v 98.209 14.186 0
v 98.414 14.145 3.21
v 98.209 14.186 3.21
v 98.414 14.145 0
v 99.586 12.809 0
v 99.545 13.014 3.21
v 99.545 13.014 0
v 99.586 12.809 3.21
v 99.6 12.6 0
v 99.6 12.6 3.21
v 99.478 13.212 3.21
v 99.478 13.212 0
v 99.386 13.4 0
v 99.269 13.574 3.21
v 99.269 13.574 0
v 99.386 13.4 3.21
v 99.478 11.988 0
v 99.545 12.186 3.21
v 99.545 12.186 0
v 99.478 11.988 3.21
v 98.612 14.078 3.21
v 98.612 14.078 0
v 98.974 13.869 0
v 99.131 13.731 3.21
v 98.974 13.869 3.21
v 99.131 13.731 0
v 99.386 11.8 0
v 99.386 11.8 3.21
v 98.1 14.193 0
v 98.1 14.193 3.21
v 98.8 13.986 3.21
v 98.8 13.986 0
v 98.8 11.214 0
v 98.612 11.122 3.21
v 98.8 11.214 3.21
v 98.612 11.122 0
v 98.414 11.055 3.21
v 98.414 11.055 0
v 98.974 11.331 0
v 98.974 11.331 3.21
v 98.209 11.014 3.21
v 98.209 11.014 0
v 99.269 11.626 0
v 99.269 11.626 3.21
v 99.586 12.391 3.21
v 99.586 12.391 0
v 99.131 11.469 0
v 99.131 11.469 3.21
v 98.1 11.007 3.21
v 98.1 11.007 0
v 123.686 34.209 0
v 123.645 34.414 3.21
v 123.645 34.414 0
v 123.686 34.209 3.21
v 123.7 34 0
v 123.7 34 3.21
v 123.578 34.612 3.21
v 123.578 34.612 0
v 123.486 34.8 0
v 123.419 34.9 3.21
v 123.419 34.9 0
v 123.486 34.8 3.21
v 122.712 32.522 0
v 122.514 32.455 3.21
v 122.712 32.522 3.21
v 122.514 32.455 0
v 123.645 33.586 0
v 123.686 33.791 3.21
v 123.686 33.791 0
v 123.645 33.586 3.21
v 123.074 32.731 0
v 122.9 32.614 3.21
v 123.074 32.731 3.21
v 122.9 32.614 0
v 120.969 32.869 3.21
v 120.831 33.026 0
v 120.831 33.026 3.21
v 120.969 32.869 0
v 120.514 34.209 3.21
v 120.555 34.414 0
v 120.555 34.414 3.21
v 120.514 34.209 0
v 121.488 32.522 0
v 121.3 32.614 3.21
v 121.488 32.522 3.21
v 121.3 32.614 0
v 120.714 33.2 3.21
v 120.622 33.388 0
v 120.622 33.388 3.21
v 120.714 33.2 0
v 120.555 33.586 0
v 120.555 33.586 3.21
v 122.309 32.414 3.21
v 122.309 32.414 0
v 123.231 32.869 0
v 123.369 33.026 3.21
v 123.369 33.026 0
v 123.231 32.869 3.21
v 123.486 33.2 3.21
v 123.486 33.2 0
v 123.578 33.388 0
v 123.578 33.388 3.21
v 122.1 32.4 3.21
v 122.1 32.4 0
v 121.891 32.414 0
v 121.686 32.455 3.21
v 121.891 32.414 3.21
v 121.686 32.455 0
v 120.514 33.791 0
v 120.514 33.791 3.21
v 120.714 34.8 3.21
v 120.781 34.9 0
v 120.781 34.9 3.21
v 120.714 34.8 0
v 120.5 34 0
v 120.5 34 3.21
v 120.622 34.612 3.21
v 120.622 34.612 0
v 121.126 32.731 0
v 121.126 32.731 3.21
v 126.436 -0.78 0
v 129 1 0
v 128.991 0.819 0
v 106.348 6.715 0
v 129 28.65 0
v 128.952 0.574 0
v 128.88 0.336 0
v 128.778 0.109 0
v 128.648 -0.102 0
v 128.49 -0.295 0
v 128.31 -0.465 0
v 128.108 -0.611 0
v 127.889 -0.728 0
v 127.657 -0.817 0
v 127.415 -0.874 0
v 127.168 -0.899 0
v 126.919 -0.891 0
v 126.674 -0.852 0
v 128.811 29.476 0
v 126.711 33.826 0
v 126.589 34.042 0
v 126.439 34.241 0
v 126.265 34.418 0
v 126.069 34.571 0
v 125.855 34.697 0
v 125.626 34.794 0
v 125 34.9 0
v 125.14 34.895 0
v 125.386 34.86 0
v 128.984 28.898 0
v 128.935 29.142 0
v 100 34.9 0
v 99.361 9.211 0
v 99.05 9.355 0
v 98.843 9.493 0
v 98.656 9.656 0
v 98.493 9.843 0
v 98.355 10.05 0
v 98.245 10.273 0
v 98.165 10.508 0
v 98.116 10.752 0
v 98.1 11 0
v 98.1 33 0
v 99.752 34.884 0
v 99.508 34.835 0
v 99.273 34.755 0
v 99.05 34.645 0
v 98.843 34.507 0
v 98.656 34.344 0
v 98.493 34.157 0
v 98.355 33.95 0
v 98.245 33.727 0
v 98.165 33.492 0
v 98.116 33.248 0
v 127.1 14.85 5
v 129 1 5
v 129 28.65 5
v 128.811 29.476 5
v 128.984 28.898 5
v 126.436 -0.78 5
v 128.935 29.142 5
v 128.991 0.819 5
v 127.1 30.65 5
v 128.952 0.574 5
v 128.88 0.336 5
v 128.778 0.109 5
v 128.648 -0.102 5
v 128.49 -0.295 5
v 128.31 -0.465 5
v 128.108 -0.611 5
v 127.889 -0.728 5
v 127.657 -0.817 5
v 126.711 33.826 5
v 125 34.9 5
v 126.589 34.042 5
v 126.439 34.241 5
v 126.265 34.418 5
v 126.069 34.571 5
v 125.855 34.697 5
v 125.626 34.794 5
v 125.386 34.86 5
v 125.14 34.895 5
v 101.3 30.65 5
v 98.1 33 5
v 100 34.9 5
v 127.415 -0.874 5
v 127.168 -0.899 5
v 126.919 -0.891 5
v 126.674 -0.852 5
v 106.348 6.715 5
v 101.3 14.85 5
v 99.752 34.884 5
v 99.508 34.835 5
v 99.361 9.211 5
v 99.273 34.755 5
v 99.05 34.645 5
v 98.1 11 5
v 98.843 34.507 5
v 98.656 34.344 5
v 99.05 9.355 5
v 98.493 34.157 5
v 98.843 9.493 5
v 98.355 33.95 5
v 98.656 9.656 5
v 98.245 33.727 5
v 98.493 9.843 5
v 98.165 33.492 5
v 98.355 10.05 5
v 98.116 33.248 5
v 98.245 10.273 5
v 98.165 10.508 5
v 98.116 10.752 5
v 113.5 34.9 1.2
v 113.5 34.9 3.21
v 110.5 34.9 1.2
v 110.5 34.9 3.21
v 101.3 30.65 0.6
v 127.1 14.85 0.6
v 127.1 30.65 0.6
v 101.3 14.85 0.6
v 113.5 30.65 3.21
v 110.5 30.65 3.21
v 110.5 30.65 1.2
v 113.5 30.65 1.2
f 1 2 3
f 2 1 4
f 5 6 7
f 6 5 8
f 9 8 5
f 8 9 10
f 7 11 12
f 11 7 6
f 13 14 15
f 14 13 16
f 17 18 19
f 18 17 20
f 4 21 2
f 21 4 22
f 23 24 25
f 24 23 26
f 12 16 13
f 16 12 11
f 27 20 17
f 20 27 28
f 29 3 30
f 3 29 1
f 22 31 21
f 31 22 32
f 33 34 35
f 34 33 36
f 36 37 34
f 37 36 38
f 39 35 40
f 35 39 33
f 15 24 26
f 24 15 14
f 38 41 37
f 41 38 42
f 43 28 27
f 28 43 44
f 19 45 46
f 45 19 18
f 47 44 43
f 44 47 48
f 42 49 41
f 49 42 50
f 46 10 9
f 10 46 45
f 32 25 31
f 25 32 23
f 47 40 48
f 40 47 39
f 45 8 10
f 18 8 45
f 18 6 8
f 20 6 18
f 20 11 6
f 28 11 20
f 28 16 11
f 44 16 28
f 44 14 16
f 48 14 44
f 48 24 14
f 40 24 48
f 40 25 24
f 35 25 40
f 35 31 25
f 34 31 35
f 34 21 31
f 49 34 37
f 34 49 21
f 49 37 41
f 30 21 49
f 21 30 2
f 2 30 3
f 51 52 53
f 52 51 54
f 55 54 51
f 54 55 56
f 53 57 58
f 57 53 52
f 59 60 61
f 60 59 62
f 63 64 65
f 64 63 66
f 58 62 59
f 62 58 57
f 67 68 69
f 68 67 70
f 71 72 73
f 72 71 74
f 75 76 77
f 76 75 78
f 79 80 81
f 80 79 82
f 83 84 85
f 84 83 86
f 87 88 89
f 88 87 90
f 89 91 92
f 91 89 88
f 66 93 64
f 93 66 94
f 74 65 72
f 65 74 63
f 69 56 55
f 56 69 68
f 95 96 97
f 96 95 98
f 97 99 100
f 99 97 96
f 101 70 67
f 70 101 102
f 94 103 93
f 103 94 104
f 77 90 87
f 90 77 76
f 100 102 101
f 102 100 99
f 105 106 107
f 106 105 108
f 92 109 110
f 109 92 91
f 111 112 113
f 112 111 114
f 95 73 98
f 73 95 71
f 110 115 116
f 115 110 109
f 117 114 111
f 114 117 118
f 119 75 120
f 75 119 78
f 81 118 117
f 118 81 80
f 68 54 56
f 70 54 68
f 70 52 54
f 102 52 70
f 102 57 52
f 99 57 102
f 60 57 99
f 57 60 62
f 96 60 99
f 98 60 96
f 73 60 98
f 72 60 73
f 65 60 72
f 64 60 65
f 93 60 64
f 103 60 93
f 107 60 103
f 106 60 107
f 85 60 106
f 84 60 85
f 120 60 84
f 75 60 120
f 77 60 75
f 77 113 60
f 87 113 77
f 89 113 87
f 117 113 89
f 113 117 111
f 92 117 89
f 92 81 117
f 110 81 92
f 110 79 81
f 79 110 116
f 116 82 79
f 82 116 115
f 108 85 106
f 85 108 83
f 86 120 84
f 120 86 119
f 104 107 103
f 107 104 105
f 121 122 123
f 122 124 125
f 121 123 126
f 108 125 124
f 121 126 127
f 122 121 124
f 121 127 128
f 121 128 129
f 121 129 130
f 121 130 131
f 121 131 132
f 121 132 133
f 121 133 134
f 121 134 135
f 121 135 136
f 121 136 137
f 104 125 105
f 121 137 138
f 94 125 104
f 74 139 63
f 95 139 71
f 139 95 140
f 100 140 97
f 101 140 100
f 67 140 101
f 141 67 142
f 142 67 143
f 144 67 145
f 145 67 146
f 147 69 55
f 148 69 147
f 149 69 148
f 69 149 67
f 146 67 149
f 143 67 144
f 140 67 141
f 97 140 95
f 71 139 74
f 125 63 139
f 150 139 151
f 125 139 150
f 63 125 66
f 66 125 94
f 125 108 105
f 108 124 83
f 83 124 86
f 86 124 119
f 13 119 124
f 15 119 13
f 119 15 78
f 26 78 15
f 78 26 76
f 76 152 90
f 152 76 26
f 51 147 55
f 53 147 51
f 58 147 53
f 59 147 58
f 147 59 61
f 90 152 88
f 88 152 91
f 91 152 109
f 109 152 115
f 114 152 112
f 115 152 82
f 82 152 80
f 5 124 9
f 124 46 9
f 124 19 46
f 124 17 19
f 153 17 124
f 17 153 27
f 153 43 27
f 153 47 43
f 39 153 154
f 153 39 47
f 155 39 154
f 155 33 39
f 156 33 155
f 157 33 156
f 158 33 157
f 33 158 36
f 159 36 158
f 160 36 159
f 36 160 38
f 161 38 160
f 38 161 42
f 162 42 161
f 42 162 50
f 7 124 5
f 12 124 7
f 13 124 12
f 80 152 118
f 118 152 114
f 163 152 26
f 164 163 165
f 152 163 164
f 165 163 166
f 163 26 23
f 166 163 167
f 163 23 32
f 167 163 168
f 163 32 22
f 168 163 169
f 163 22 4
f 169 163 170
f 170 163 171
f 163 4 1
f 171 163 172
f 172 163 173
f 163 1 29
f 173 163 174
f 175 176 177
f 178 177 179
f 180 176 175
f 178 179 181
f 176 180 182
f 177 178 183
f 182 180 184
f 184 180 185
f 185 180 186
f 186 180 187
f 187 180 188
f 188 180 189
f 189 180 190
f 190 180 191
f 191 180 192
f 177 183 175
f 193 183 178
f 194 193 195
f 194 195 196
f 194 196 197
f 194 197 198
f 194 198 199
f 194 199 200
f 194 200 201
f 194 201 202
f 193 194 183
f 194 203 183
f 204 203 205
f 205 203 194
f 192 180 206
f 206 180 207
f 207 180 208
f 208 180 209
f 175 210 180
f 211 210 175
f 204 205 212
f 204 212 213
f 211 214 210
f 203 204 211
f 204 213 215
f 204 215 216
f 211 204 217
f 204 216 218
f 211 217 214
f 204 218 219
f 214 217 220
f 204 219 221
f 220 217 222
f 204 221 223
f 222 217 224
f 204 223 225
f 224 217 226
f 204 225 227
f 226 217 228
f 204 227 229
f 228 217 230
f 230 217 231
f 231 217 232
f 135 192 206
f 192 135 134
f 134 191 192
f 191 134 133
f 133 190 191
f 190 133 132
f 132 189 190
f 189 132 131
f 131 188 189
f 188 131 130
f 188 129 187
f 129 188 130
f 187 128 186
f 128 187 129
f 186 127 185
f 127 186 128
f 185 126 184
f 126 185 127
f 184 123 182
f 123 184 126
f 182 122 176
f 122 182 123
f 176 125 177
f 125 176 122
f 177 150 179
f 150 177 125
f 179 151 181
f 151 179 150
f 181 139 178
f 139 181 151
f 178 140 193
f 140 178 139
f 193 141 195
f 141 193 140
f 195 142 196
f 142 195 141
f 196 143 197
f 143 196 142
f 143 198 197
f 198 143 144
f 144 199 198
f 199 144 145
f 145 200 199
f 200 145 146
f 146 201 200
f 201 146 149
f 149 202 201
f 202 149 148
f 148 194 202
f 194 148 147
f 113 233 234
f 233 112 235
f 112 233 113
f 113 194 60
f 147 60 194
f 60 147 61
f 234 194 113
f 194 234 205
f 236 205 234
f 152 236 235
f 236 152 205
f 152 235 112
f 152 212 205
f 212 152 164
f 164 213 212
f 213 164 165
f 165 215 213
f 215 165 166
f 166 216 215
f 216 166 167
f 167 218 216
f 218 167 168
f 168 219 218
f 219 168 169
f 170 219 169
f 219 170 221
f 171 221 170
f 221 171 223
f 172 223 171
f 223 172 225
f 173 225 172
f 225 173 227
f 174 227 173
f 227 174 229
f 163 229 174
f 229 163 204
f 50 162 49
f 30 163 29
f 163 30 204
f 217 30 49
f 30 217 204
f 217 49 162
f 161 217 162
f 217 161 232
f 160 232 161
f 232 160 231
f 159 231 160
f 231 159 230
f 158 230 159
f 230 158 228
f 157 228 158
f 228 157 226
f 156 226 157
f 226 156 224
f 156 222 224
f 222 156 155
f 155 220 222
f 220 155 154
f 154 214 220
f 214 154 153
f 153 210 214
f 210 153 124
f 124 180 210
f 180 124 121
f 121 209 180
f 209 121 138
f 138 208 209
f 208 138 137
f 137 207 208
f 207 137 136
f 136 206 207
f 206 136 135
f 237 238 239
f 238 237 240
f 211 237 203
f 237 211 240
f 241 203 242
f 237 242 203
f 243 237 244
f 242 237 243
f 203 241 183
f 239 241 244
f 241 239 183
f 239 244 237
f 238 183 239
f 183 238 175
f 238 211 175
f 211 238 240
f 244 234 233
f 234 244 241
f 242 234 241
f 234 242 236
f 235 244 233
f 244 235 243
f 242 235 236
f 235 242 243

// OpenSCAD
// ULP split: thin tray case with LiPo pocket (401525) in the notch between thumb cluster and battery connector.
// Coordinates = ergogen points (left half, mm, y up). Right half = mirror image.
// Board outline: pcb_left.dxf (copy of pcb/output/outlines/left.dxf, re-copy after changing pcb/config.yaml).
//
// Stack (z, from bottom):  floor | gap for diodes + switch pins | PCB | lip
// PCB rests on a perimeter ledge + one post per key and is held by M2 screws from the top into bosses
// (heat-set inserts M2 x 3 x 3.2 OD, or self-tapping with screw_hole = 1.7). Screws M2 x 4.
// mounts: heads clear of the keycaps. mounts_opt: under the keycaps, between switch housings (low head only).
// Battery sits beside the PCB (no PCB above it), so it can be thicker than the gap under the board.
//
// openscad -D 'side="right"' -o right.stl case.scad

side = "left";          // "left" | "right"

/* [Case] */
wall    = 1.6;          // outer wall
clr     = 0.3;          // PCB edge clearance
floor_t = 1.2;          // floor under the PCB
gap     = 2.0;          // floor to PCB bottom (SOD-123 ~1.2 + THT pin stubs)
pcb_t   = 0.8;
lip     = 1.0;          // wall height above PCB top
ledge   = 1.5;          // perimeter shelf under the PCB edge
post_r  = 1.5;          // support post under each key
boss_d  = 4.6;          // screw boss under the PCB
screw_hole = 3.2;       // 3.2 heat-set insert, 1.7 self-tapping M2
use_opt = true;         // bosses for the optional under-keycap holes

/* [Battery 401525] */
bat     = [25, 15, 4.0];  // nominal L x W x T (check your cell incl. protection PCB + tape)
bat_clr = 0.4;          // per side (L, W)
pocket_floor = 0.6;     // floor under the battery

/* [Cutouts] */
usb_w   = 13;           // USB-C plug overmold opening
usb_z   = 2.0;          // opening starts this high above case bottom
sw_w    = 9;            // power switch lever opening
wire_w  = 3;            // wire channel, connector/cable slot -> pocket

$fn = 48;

h       = floor_t + gap + pcb_t + lip;   // total height
z_pcb   = floor_t + gap;                 // PCB bottom
pocket_d = h - pocket_floor;
assert(pocket_d >= bat[2] + 0.2, str("pocket too shallow: ", pocket_d, " mm for ", bat[2], " mm cell, raise lip/gap"));

// --- key positions from ergogen points (x, y, rotation) ---
keys = [
  [0, 0, 0], [0, 17, 0], [0, 34, 0], [0, 51, 0],              // outer
  [18, 0, 0], [18, 17, 0], [18, 34, 0], [18, 51, 0],          // pinky
  [36, 8.5, 0], [36, 25.5, 0], [36, 42.5, 0], [36, 59.5, 0],  // ring
  [54, 12.75, 0], [54, 29.75, 0], [54, 46.75, 0], [54, 63.75, 0], // middle
  [72, 25.5, 0], [72, 42.5, 0], [72, 59.5, 0],                // index
  [90, 22.95, 0], [90, 39.95, 0], [90, 56.95, 0],             // inner
  [76.5, 5, -6], [95.3512, 1.676, -14], [113.5563, -4.2392, -22], // thumbs near, mid, far
];
post_off = [0, 2];      // key-local spot clear of switch pins (y -2.3) and diode (y +5.5)

// M2 holes, same as pcb/config.yaml mount_* / mount_opt_*
mounts = [[-11, 42.5], [-11, 8.5], [9, 61.5], [9, -10.5],         // outer side tabs
          [65.9, 14.5], [77.7, 15.2], [98.0, 12.6],               // thumb gap
          [105.8, 50.2], [122.1, 34.0]];                          // controller column
mounts_opt = [[9, 25.5], [27.8, 17], [27.8, 51], [44.1, 34], [63.8, 51], [72, 34.4], [86.7, 48.8]];
holes = concat(mounts, use_opt ? mounts_opt : []);

// parts referenced to matrix_inner_top (90, 56.95)
mcu_c   = [112, 69.45];  // XIAO, USB-C at +y board edge (y 79.95)
conn_c  = [112, 35.45];  // Pico-EZmate header
slot_c  = [112, 43.95];  // cable hole through the PCB
power_c = [122.9, 50.95];// slide switch, lever towards +x
usb_edge = 79.95;
mcu_x1   = 125;          // MCU column outer edge (x)

// --- battery pocket: in the notch below the MCU column, above the far thumb ---
pk_w = bat[0] + 2*bat_clr;
pk_h = bat[1] + 2*bat_clr;
pk_x0 = 101 + clr;               // inner column edge
pk_y1 = 30.95 - clr;             // MCU column bottom edge
pk = [pk_x0, pk_y1 - pk_h, pk_w, pk_h];   // x, y, w, h

module pcb2d() {
  // close the cable slot (1.5 mm slit + r1.25 hole) so the case doesn't follow it
  offset(r = -1.5) offset(r = 1.5) import("pcb_left.dxf");
}

module notch_fill() {
  px1 = pk[0] + pk[2];
  // points sit inside the inner/MCU/thumb outlines so the union has no slivers
  polygon([[100, 33], [mcu_x1, 33], [px1, pk[1] + pk[3] - 2], [px1, 1], [107, 8.5], [100, 11]]);
}

module outer2d() { offset(r = clr + wall) union() { pcb2d(); notch_fill(); } }

module pocket2d() { translate([pk[0], pk[1]]) square([pk[2], pk[3]]); }

module key_posts() {
  for (k = keys) translate([k[0], k[1]]) rotate(k[2]) translate(post_off) circle(r = post_r);
}

module case_left() {
  difference() {
    linear_extrude(h) outer2d();

    // PCB pocket
    translate([0, 0, z_pcb]) linear_extrude(h) offset(r = clr) pcb2d();
    // space under PCB, minus ledge and posts
    translate([0, 0, floor_t]) linear_extrude(gap + 0.01) difference() {
      offset(r = -ledge) pcb2d();
      key_posts();
      for (m = holes) translate(m) circle(d = boss_d);
    }
    // screw holes through bosses and floor
    for (m = holes) translate([m[0], m[1], -1]) cylinder(d = screw_hole, h = z_pcb + 1.01);
    // battery pocket
    translate([0, 0, pocket_floor]) linear_extrude(h) pocket2d();
    // wire channel through the ledge: cable hole -> pocket (under the PCB)
    translate([slot_c[0] - wire_w/2, pk[1] + pk[3] - 1, floor_t])
      cube([wire_w, slot_c[1] - (pk[1] + pk[3]) + 2, gap + 0.01]);
    // USB-C
    translate([mcu_c[0] - usb_w/2, usb_edge - 3, usb_z]) cube([usb_w, 10, h]);
    // power switch lever (only above PCB top, ledge keeps supporting the edge)
    translate([mcu_x1 - 1, power_c[1] - sw_w/2, z_pcb + pcb_t - 0.2]) cube([10, sw_w, h]);
  }
}

if (side == "right") mirror([1, 0, 0]) case_left();
else case_left();

// ghost parts for checking fit (F5 preview only)
%if (side == "left") {
  translate([0, 0, z_pcb]) linear_extrude(pcb_t) pcb2d();
  translate([pk[0] + bat_clr, pk[1] + bat_clr, pocket_floor]) cube([bat[0], bat[1], bat[2]]);
}
